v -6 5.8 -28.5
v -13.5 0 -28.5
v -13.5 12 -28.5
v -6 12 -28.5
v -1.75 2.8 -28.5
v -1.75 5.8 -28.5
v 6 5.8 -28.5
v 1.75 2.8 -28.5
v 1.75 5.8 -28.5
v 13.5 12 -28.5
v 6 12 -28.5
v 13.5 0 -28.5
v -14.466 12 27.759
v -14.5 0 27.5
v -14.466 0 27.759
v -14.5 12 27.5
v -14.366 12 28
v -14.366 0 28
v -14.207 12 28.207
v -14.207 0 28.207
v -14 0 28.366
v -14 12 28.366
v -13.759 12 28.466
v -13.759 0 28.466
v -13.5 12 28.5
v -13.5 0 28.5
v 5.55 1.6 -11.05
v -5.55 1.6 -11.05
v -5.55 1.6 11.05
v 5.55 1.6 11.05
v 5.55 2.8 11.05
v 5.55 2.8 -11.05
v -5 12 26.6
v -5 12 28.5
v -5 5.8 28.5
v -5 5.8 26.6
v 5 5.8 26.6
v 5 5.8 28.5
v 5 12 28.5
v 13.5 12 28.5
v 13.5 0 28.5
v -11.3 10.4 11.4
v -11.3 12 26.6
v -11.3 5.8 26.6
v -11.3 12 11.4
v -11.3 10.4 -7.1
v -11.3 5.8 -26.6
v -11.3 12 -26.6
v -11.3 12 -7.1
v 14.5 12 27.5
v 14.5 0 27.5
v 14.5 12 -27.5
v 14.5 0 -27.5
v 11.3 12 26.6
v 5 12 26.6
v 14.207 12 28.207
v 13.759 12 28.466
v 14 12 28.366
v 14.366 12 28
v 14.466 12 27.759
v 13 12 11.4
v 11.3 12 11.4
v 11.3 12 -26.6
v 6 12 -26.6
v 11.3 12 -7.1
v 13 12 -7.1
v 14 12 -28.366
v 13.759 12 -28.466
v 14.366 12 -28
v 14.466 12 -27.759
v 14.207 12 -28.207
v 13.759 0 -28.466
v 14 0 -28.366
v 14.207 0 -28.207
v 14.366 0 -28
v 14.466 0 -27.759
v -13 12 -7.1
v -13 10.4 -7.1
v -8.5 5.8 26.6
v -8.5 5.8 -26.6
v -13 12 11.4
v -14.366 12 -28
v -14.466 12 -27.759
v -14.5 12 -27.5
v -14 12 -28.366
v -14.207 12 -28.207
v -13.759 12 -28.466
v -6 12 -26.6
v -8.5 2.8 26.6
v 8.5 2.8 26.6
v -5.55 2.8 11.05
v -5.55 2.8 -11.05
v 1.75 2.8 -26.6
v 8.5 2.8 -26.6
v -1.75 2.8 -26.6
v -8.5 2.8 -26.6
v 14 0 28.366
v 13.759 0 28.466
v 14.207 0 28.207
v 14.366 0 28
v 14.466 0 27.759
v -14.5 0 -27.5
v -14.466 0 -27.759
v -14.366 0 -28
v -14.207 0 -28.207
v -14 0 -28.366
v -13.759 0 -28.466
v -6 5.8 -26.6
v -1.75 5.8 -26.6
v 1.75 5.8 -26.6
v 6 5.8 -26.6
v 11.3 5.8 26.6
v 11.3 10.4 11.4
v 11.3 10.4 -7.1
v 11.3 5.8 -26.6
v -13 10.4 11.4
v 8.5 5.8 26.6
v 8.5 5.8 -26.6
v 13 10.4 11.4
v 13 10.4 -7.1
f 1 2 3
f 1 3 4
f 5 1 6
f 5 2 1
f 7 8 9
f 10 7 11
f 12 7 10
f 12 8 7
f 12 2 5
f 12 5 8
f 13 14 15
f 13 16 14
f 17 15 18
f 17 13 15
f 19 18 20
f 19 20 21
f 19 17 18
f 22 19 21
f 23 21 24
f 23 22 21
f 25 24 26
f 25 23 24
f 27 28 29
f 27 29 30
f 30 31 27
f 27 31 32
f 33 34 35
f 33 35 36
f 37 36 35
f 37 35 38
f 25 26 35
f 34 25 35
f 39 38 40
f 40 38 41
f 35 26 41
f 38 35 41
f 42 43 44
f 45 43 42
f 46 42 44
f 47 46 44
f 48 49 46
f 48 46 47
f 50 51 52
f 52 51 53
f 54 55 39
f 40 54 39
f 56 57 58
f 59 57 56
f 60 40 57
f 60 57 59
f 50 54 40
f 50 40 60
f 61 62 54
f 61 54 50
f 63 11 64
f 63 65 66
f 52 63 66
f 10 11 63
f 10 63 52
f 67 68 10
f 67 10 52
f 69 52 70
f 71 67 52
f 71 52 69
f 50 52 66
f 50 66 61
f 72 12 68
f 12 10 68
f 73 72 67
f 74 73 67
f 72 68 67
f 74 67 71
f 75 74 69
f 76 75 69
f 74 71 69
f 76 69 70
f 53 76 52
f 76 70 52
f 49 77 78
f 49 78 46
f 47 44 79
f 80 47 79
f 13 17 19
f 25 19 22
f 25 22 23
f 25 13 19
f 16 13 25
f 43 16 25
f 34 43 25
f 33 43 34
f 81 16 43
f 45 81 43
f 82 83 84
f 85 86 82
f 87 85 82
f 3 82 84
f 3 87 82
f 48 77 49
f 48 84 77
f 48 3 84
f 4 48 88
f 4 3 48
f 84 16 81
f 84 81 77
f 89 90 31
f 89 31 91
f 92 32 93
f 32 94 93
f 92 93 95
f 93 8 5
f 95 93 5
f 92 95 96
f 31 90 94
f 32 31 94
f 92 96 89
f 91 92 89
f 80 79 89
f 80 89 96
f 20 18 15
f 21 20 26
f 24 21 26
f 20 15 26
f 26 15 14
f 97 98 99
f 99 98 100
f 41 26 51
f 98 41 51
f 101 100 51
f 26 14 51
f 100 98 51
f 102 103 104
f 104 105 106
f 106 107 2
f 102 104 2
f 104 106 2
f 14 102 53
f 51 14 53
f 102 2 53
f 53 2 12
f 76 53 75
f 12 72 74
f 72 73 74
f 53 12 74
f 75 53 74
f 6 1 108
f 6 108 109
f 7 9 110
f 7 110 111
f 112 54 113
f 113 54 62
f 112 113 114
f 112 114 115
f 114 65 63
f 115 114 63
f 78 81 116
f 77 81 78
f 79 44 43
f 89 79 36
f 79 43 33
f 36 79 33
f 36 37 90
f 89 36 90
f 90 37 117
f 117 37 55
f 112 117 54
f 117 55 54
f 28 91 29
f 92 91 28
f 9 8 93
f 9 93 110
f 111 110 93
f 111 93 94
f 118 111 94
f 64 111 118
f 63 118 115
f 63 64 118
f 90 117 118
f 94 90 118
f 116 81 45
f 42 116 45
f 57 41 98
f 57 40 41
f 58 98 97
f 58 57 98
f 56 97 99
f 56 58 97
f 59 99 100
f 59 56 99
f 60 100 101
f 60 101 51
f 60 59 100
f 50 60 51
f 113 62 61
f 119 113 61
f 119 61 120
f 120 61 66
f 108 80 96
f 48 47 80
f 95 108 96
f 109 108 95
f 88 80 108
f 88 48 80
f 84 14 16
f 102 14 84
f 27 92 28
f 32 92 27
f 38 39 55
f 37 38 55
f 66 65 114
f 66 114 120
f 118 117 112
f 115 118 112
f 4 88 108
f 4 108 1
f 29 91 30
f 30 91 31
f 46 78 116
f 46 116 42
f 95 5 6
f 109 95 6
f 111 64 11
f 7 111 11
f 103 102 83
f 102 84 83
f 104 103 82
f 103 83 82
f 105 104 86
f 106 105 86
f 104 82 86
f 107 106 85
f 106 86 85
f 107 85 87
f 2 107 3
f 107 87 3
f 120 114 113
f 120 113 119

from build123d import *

# Parameters (mm, degrees)
SKETCH2_W           = 29
SKETCH2_H           = 57
BOSS_EXTRUDE1_DEPTH = 12
SKETCH3_W           = 22.6
SKETCH3_H           = 53.2
CUT_EXTRUDE1_DEPTH  = 6.2
SKETCH4_W           = 17
SKETCH4_H           = 53.2
CUT_EXTRUDE2_DEPTH  = 3
SKETCH5_W           = 11.1
SKETCH5_H           = 22.1
CUT_EXTRUDE3_DEPTH  = 1.2
SKETCH6_W           = 26
SKETCH6_H           = 18.5
CUT_EXTRUDE4_DEPTH  = 1.6
SKETCH7_W           = 12
SKETCH7_H           = 1.9
SKETCH7_W_2         = 10
CUT_EXTRUDE5_DEPTH  = 6.2
FILLET1_R           = 1
SKETCH8_W           = 3.5
SKETCH8_H           = 3
CUT_EXTRUDE6_DEPTH  = 10


with BuildPart() as part:
    # Sketch2 → Boss-Extrude1 (new body)
    with BuildSketch(Plane(origin=(0, 0, 0), x_dir=(1, 0, 0), z_dir=(0, 1, 0))):
        Rectangle(SKETCH2_W, SKETCH2_H)
    extrude(amount=BOSS_EXTRUDE1_DEPTH)

    # Sketch3 → Cut-Extrude1 (cut)
    with BuildSketch(Plane(origin=(0, 12, 0), x_dir=(1, 0, 0), z_dir=(0, 1, 0))):
        Rectangle(SKETCH3_W, SKETCH3_H)
    extrude(amount=-CUT_EXTRUDE1_DEPTH, mode=Mode.SUBTRACT)

    # Sketch4 → Cut-Extrude2 (cut)
    with BuildSketch(Plane(origin=(0, 5.8, 0), x_dir=(1, 0, 0), z_dir=(0, 1, 0))):
        Rectangle(SKETCH4_W, SKETCH4_H)
    extrude(amount=-CUT_EXTRUDE2_DEPTH, mode=Mode.SUBTRACT)

    # Sketch5 → Cut-Extrude3 (cut)
    with BuildSketch(Plane(origin=(0, 2.8, 0), x_dir=(1, 0, 0), z_dir=(0, 1, 0))):
        Rectangle(SKETCH5_W, SKETCH5_H)
    extrude(amount=-CUT_EXTRUDE3_DEPTH, mode=Mode.SUBTRACT)

    # Sketch6 → Cut-Extrude4 (cut)
    with BuildSketch(Plane(origin=(0, 12, 0), x_dir=(1, 0, 0), z_dir=(0, 1, 0))):
        with Locations((0, -2.15)):
            Rectangle(SKETCH6_W, SKETCH6_H)
    extrude(amount=-CUT_EXTRUDE4_DEPTH, mode=Mode.SUBTRACT)

    # Sketch7 → Cut-Extrude5 (cut)
    with BuildSketch(Plane(origin=(0, 12, 0), x_dir=(1, 0, 0), z_dir=(0, 1, 0))):
        with Locations((0, 27.55)):
            Rectangle(SKETCH7_W, SKETCH7_H)
        with Locations((0, -27.55)):
            Rectangle(SKETCH7_W_2, SKETCH7_H)
    extrude(amount=-CUT_EXTRUDE5_DEPTH, mode=Mode.SUBTRACT)

    # Fillet1
    fillet1_edges = [part.edges().sort_by_distance(p)[0] for p in [
        (14.5, 6, 28.5),
        (-14.5, 6, 28.5),
        (-14.5, 6, -28.5),
        (14.5, 6, -28.5),
    ]]
    fillet(fillet1_edges, radius=FILLET1_R)

    # Sketch8 → Cut-Extrude6 (cut)
    with BuildSketch(Plane(origin=(0, 0, -28.5), x_dir=(-1, 0, 0), z_dir=(0, 0, -1))):
        with Locations((0, 4.3)):
            Rectangle(SKETCH8_W, SKETCH8_H)
    extrude(amount=-CUT_EXTRUDE6_DEPTH, mode=Mode.SUBTRACT)


solid = part.part
